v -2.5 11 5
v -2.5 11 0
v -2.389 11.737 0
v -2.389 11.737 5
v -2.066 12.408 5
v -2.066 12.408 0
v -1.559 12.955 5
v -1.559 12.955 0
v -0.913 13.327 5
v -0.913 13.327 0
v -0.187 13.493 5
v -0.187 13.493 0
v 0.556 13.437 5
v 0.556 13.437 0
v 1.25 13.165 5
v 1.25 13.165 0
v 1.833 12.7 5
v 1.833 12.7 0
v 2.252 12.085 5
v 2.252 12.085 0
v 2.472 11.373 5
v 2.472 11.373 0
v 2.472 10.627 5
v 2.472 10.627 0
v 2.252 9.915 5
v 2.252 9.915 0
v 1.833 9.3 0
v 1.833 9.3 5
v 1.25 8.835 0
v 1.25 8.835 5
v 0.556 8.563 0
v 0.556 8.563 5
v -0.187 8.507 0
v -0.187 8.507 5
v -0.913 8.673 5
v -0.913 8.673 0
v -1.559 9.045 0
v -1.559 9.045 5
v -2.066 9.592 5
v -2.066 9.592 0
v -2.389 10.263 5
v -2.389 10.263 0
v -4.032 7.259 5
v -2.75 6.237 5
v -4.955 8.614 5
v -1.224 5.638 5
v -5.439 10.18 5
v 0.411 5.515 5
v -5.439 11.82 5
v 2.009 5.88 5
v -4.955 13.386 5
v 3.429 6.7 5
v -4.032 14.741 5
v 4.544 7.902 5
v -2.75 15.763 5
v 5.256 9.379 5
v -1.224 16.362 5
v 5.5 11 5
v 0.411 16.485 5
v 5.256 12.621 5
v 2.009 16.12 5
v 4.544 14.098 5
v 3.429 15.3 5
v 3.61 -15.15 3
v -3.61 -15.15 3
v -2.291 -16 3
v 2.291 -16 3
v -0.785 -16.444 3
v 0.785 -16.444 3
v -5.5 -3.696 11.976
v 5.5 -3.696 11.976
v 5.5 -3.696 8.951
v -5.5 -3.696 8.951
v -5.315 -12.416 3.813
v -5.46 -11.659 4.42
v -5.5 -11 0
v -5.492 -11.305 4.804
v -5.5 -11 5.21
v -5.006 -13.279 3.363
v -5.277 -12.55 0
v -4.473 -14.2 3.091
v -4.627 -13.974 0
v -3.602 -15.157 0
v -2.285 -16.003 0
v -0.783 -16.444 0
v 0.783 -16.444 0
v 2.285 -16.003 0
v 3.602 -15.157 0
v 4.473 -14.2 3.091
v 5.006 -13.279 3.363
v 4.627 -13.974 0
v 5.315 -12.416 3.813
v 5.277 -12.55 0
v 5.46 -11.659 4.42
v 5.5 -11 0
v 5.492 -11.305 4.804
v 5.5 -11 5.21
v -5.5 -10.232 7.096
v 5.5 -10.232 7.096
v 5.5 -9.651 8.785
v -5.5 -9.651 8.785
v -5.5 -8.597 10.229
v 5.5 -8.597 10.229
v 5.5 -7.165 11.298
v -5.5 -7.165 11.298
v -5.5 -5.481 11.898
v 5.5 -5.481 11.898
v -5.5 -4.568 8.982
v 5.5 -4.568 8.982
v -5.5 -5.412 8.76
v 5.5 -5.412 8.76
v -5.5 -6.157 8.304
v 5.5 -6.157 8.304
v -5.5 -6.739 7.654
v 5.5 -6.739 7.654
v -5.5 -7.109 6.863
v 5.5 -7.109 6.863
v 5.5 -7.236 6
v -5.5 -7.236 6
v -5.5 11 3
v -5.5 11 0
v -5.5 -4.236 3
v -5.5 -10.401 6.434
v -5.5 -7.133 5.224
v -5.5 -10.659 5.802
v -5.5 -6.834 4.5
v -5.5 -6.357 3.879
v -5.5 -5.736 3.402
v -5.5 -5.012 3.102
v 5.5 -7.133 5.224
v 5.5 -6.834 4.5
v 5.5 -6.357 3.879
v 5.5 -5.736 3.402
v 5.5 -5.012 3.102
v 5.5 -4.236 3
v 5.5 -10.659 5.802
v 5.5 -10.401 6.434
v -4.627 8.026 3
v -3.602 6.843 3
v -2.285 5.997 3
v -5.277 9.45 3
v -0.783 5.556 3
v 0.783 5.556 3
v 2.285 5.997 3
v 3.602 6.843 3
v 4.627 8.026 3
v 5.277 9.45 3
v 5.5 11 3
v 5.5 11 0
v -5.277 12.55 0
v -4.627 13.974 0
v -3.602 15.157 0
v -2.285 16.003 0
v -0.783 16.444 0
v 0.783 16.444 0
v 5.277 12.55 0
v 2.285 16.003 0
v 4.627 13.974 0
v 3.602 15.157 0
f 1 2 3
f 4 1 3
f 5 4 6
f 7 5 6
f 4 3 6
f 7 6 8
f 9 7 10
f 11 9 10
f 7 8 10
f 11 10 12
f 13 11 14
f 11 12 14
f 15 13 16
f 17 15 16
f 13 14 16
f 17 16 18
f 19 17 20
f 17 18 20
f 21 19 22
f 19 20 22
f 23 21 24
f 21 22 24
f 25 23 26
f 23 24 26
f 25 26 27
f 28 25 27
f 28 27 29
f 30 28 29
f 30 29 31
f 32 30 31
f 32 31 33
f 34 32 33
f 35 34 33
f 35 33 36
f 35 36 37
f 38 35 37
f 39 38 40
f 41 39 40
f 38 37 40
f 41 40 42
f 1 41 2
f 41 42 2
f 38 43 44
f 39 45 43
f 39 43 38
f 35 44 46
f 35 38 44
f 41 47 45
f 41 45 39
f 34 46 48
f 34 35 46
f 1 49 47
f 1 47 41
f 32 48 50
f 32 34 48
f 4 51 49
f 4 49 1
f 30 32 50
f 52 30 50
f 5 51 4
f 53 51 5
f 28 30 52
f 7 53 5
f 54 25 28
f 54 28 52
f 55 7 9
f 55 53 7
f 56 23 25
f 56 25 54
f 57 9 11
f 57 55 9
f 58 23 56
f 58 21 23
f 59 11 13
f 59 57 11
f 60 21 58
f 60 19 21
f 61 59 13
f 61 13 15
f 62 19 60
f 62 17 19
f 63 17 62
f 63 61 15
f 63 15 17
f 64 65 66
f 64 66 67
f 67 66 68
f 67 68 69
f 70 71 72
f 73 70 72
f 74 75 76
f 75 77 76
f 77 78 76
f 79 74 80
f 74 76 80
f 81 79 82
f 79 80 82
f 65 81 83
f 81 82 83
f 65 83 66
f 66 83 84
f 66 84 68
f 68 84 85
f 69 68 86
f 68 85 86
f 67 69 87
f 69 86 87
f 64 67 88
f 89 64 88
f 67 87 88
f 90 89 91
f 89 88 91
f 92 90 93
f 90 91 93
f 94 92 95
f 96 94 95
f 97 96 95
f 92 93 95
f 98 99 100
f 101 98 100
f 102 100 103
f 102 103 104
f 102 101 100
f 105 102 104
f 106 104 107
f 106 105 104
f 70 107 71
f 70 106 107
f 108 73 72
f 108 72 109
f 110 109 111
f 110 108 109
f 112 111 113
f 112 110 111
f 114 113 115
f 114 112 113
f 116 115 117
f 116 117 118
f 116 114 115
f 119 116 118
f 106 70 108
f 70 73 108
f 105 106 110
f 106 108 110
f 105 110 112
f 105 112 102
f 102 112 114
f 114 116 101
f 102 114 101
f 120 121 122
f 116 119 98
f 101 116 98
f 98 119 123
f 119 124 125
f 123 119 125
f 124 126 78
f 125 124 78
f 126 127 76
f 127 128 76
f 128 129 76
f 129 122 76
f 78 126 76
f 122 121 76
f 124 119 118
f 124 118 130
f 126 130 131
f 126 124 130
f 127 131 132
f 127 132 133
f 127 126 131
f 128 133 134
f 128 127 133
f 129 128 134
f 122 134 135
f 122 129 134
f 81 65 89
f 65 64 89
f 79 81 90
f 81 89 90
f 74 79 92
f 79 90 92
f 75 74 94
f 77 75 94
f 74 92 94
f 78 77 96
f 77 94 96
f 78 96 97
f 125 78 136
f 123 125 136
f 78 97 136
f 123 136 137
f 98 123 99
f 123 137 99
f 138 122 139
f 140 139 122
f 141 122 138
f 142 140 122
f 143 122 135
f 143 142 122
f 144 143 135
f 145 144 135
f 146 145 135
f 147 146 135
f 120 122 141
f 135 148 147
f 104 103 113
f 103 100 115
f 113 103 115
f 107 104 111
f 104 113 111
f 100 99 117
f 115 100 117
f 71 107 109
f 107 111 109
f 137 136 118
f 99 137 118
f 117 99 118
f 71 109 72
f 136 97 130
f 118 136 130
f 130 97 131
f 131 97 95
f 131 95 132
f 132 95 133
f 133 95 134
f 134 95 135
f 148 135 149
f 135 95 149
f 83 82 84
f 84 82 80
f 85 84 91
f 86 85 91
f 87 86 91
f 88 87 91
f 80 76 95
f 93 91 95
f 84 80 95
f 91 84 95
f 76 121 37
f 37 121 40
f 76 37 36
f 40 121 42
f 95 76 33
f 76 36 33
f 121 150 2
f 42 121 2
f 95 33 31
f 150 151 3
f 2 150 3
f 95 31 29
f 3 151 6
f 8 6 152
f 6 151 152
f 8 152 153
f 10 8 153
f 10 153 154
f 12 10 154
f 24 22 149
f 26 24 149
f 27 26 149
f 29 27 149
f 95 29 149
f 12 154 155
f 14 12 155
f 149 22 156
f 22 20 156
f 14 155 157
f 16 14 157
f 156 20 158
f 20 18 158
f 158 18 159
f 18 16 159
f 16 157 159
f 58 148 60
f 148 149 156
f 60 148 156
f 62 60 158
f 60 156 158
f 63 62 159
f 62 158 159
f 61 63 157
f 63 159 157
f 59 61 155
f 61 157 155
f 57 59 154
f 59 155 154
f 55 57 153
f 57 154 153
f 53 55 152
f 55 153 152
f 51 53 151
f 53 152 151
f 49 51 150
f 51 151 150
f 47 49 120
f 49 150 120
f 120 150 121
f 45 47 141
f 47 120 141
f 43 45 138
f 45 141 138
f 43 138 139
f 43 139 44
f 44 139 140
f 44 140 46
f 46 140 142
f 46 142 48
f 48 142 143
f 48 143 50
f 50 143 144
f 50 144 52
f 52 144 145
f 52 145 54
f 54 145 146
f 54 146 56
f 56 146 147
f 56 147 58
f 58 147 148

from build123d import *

# Parameters (mm, degrees)
F1_DEPTH = 3
F2_DEPTH = 5
F4_DEPTH = 11
F5_R     = 5


with BuildPart() as f1:
    # F0 (on Top) → F1 (new body)
    with BuildSketch(Plane.XY):
        with BuildLine():
            Line((-5.5, 11), (-5.5, -11))
            ThreePointArc((-5.5, -11), (0, -5.5), (5.5, -11))
            Line((5.5, -11), (5.5, 11))
            ThreePointArc((5.5, 11), (0, 5.5), (-5.5, 11))
        make_face()
        with BuildLine():
            ThreePointArc((5.5, -11), (0, -5.5), (-5.5, -11))
            Line((-5.5, -11), (5.5, -11))
        make_face()
        with BuildLine():
            Line((5.5, -11), (-5.5, -11))
            ThreePointArc((-5.5, -11), (0, -16.5), (5.5, -11))
        make_face()
    extrude(amount=F1_DEPTH)

    # F0 (on Top) → F2 (join)
    with BuildSketch(Plane.XY):
        with BuildLine():
            Line((-2.5, 11), (-5.5, 11))
            ThreePointArc((-5.5, 11), (0, 5.5), (5.5, 11))
            Line((5.5, 11), (2.5, 11))
            ThreePointArc((2.5, 11), (0, 8.5), (-2.5, 11))
        make_face()
        with BuildLine():
            ThreePointArc((5.5, 11), (0, 16.5), (-5.5, 11))
            Line((-5.5, 11), (-2.5, 11))
            ThreePointArc((-2.5, 11), (0, 13.5), (2.5, 11))
            Line((2.5, 11), (5.5, 11))
        make_face()
    extrude(amount=F2_DEPTH)

    # F3 (on face) → F4 (join)
    with BuildSketch(Plane(origin=(-5.5, 0, 0), x_dir=(0, -1, 0), z_dir=(-1, 0, 0))):
        with BuildLine():
            ThreePointArc((3.6959245331, 8.9510570469), (6.1566711465, 8.3042419241), (7.2356117629, 6))
            ThreePointArc((7.2356117629, 6), (6.3569321064, 3.8786796564), (4.2356117629, 3))
            Line((4.2356117629, 3), (9.5210892795, 3))
            ThreePointArc((9.5210892795, 3), (9.3640881698, 9.2761960602), (3.6959245331, 11.975678848))
            Line((3.6959245331, 11.975678848), (3.6959245331, 8.9510570469))
        make_face()
    extrude(amount=-F4_DEPTH)

    # F5
    f5_edges = [f1.edges().sort_by_distance(p)[0] for p in [
        (0, -9.521089, 3),
    ]]
    fillet(f5_edges, radius=F5_R)


solid = f1.part
